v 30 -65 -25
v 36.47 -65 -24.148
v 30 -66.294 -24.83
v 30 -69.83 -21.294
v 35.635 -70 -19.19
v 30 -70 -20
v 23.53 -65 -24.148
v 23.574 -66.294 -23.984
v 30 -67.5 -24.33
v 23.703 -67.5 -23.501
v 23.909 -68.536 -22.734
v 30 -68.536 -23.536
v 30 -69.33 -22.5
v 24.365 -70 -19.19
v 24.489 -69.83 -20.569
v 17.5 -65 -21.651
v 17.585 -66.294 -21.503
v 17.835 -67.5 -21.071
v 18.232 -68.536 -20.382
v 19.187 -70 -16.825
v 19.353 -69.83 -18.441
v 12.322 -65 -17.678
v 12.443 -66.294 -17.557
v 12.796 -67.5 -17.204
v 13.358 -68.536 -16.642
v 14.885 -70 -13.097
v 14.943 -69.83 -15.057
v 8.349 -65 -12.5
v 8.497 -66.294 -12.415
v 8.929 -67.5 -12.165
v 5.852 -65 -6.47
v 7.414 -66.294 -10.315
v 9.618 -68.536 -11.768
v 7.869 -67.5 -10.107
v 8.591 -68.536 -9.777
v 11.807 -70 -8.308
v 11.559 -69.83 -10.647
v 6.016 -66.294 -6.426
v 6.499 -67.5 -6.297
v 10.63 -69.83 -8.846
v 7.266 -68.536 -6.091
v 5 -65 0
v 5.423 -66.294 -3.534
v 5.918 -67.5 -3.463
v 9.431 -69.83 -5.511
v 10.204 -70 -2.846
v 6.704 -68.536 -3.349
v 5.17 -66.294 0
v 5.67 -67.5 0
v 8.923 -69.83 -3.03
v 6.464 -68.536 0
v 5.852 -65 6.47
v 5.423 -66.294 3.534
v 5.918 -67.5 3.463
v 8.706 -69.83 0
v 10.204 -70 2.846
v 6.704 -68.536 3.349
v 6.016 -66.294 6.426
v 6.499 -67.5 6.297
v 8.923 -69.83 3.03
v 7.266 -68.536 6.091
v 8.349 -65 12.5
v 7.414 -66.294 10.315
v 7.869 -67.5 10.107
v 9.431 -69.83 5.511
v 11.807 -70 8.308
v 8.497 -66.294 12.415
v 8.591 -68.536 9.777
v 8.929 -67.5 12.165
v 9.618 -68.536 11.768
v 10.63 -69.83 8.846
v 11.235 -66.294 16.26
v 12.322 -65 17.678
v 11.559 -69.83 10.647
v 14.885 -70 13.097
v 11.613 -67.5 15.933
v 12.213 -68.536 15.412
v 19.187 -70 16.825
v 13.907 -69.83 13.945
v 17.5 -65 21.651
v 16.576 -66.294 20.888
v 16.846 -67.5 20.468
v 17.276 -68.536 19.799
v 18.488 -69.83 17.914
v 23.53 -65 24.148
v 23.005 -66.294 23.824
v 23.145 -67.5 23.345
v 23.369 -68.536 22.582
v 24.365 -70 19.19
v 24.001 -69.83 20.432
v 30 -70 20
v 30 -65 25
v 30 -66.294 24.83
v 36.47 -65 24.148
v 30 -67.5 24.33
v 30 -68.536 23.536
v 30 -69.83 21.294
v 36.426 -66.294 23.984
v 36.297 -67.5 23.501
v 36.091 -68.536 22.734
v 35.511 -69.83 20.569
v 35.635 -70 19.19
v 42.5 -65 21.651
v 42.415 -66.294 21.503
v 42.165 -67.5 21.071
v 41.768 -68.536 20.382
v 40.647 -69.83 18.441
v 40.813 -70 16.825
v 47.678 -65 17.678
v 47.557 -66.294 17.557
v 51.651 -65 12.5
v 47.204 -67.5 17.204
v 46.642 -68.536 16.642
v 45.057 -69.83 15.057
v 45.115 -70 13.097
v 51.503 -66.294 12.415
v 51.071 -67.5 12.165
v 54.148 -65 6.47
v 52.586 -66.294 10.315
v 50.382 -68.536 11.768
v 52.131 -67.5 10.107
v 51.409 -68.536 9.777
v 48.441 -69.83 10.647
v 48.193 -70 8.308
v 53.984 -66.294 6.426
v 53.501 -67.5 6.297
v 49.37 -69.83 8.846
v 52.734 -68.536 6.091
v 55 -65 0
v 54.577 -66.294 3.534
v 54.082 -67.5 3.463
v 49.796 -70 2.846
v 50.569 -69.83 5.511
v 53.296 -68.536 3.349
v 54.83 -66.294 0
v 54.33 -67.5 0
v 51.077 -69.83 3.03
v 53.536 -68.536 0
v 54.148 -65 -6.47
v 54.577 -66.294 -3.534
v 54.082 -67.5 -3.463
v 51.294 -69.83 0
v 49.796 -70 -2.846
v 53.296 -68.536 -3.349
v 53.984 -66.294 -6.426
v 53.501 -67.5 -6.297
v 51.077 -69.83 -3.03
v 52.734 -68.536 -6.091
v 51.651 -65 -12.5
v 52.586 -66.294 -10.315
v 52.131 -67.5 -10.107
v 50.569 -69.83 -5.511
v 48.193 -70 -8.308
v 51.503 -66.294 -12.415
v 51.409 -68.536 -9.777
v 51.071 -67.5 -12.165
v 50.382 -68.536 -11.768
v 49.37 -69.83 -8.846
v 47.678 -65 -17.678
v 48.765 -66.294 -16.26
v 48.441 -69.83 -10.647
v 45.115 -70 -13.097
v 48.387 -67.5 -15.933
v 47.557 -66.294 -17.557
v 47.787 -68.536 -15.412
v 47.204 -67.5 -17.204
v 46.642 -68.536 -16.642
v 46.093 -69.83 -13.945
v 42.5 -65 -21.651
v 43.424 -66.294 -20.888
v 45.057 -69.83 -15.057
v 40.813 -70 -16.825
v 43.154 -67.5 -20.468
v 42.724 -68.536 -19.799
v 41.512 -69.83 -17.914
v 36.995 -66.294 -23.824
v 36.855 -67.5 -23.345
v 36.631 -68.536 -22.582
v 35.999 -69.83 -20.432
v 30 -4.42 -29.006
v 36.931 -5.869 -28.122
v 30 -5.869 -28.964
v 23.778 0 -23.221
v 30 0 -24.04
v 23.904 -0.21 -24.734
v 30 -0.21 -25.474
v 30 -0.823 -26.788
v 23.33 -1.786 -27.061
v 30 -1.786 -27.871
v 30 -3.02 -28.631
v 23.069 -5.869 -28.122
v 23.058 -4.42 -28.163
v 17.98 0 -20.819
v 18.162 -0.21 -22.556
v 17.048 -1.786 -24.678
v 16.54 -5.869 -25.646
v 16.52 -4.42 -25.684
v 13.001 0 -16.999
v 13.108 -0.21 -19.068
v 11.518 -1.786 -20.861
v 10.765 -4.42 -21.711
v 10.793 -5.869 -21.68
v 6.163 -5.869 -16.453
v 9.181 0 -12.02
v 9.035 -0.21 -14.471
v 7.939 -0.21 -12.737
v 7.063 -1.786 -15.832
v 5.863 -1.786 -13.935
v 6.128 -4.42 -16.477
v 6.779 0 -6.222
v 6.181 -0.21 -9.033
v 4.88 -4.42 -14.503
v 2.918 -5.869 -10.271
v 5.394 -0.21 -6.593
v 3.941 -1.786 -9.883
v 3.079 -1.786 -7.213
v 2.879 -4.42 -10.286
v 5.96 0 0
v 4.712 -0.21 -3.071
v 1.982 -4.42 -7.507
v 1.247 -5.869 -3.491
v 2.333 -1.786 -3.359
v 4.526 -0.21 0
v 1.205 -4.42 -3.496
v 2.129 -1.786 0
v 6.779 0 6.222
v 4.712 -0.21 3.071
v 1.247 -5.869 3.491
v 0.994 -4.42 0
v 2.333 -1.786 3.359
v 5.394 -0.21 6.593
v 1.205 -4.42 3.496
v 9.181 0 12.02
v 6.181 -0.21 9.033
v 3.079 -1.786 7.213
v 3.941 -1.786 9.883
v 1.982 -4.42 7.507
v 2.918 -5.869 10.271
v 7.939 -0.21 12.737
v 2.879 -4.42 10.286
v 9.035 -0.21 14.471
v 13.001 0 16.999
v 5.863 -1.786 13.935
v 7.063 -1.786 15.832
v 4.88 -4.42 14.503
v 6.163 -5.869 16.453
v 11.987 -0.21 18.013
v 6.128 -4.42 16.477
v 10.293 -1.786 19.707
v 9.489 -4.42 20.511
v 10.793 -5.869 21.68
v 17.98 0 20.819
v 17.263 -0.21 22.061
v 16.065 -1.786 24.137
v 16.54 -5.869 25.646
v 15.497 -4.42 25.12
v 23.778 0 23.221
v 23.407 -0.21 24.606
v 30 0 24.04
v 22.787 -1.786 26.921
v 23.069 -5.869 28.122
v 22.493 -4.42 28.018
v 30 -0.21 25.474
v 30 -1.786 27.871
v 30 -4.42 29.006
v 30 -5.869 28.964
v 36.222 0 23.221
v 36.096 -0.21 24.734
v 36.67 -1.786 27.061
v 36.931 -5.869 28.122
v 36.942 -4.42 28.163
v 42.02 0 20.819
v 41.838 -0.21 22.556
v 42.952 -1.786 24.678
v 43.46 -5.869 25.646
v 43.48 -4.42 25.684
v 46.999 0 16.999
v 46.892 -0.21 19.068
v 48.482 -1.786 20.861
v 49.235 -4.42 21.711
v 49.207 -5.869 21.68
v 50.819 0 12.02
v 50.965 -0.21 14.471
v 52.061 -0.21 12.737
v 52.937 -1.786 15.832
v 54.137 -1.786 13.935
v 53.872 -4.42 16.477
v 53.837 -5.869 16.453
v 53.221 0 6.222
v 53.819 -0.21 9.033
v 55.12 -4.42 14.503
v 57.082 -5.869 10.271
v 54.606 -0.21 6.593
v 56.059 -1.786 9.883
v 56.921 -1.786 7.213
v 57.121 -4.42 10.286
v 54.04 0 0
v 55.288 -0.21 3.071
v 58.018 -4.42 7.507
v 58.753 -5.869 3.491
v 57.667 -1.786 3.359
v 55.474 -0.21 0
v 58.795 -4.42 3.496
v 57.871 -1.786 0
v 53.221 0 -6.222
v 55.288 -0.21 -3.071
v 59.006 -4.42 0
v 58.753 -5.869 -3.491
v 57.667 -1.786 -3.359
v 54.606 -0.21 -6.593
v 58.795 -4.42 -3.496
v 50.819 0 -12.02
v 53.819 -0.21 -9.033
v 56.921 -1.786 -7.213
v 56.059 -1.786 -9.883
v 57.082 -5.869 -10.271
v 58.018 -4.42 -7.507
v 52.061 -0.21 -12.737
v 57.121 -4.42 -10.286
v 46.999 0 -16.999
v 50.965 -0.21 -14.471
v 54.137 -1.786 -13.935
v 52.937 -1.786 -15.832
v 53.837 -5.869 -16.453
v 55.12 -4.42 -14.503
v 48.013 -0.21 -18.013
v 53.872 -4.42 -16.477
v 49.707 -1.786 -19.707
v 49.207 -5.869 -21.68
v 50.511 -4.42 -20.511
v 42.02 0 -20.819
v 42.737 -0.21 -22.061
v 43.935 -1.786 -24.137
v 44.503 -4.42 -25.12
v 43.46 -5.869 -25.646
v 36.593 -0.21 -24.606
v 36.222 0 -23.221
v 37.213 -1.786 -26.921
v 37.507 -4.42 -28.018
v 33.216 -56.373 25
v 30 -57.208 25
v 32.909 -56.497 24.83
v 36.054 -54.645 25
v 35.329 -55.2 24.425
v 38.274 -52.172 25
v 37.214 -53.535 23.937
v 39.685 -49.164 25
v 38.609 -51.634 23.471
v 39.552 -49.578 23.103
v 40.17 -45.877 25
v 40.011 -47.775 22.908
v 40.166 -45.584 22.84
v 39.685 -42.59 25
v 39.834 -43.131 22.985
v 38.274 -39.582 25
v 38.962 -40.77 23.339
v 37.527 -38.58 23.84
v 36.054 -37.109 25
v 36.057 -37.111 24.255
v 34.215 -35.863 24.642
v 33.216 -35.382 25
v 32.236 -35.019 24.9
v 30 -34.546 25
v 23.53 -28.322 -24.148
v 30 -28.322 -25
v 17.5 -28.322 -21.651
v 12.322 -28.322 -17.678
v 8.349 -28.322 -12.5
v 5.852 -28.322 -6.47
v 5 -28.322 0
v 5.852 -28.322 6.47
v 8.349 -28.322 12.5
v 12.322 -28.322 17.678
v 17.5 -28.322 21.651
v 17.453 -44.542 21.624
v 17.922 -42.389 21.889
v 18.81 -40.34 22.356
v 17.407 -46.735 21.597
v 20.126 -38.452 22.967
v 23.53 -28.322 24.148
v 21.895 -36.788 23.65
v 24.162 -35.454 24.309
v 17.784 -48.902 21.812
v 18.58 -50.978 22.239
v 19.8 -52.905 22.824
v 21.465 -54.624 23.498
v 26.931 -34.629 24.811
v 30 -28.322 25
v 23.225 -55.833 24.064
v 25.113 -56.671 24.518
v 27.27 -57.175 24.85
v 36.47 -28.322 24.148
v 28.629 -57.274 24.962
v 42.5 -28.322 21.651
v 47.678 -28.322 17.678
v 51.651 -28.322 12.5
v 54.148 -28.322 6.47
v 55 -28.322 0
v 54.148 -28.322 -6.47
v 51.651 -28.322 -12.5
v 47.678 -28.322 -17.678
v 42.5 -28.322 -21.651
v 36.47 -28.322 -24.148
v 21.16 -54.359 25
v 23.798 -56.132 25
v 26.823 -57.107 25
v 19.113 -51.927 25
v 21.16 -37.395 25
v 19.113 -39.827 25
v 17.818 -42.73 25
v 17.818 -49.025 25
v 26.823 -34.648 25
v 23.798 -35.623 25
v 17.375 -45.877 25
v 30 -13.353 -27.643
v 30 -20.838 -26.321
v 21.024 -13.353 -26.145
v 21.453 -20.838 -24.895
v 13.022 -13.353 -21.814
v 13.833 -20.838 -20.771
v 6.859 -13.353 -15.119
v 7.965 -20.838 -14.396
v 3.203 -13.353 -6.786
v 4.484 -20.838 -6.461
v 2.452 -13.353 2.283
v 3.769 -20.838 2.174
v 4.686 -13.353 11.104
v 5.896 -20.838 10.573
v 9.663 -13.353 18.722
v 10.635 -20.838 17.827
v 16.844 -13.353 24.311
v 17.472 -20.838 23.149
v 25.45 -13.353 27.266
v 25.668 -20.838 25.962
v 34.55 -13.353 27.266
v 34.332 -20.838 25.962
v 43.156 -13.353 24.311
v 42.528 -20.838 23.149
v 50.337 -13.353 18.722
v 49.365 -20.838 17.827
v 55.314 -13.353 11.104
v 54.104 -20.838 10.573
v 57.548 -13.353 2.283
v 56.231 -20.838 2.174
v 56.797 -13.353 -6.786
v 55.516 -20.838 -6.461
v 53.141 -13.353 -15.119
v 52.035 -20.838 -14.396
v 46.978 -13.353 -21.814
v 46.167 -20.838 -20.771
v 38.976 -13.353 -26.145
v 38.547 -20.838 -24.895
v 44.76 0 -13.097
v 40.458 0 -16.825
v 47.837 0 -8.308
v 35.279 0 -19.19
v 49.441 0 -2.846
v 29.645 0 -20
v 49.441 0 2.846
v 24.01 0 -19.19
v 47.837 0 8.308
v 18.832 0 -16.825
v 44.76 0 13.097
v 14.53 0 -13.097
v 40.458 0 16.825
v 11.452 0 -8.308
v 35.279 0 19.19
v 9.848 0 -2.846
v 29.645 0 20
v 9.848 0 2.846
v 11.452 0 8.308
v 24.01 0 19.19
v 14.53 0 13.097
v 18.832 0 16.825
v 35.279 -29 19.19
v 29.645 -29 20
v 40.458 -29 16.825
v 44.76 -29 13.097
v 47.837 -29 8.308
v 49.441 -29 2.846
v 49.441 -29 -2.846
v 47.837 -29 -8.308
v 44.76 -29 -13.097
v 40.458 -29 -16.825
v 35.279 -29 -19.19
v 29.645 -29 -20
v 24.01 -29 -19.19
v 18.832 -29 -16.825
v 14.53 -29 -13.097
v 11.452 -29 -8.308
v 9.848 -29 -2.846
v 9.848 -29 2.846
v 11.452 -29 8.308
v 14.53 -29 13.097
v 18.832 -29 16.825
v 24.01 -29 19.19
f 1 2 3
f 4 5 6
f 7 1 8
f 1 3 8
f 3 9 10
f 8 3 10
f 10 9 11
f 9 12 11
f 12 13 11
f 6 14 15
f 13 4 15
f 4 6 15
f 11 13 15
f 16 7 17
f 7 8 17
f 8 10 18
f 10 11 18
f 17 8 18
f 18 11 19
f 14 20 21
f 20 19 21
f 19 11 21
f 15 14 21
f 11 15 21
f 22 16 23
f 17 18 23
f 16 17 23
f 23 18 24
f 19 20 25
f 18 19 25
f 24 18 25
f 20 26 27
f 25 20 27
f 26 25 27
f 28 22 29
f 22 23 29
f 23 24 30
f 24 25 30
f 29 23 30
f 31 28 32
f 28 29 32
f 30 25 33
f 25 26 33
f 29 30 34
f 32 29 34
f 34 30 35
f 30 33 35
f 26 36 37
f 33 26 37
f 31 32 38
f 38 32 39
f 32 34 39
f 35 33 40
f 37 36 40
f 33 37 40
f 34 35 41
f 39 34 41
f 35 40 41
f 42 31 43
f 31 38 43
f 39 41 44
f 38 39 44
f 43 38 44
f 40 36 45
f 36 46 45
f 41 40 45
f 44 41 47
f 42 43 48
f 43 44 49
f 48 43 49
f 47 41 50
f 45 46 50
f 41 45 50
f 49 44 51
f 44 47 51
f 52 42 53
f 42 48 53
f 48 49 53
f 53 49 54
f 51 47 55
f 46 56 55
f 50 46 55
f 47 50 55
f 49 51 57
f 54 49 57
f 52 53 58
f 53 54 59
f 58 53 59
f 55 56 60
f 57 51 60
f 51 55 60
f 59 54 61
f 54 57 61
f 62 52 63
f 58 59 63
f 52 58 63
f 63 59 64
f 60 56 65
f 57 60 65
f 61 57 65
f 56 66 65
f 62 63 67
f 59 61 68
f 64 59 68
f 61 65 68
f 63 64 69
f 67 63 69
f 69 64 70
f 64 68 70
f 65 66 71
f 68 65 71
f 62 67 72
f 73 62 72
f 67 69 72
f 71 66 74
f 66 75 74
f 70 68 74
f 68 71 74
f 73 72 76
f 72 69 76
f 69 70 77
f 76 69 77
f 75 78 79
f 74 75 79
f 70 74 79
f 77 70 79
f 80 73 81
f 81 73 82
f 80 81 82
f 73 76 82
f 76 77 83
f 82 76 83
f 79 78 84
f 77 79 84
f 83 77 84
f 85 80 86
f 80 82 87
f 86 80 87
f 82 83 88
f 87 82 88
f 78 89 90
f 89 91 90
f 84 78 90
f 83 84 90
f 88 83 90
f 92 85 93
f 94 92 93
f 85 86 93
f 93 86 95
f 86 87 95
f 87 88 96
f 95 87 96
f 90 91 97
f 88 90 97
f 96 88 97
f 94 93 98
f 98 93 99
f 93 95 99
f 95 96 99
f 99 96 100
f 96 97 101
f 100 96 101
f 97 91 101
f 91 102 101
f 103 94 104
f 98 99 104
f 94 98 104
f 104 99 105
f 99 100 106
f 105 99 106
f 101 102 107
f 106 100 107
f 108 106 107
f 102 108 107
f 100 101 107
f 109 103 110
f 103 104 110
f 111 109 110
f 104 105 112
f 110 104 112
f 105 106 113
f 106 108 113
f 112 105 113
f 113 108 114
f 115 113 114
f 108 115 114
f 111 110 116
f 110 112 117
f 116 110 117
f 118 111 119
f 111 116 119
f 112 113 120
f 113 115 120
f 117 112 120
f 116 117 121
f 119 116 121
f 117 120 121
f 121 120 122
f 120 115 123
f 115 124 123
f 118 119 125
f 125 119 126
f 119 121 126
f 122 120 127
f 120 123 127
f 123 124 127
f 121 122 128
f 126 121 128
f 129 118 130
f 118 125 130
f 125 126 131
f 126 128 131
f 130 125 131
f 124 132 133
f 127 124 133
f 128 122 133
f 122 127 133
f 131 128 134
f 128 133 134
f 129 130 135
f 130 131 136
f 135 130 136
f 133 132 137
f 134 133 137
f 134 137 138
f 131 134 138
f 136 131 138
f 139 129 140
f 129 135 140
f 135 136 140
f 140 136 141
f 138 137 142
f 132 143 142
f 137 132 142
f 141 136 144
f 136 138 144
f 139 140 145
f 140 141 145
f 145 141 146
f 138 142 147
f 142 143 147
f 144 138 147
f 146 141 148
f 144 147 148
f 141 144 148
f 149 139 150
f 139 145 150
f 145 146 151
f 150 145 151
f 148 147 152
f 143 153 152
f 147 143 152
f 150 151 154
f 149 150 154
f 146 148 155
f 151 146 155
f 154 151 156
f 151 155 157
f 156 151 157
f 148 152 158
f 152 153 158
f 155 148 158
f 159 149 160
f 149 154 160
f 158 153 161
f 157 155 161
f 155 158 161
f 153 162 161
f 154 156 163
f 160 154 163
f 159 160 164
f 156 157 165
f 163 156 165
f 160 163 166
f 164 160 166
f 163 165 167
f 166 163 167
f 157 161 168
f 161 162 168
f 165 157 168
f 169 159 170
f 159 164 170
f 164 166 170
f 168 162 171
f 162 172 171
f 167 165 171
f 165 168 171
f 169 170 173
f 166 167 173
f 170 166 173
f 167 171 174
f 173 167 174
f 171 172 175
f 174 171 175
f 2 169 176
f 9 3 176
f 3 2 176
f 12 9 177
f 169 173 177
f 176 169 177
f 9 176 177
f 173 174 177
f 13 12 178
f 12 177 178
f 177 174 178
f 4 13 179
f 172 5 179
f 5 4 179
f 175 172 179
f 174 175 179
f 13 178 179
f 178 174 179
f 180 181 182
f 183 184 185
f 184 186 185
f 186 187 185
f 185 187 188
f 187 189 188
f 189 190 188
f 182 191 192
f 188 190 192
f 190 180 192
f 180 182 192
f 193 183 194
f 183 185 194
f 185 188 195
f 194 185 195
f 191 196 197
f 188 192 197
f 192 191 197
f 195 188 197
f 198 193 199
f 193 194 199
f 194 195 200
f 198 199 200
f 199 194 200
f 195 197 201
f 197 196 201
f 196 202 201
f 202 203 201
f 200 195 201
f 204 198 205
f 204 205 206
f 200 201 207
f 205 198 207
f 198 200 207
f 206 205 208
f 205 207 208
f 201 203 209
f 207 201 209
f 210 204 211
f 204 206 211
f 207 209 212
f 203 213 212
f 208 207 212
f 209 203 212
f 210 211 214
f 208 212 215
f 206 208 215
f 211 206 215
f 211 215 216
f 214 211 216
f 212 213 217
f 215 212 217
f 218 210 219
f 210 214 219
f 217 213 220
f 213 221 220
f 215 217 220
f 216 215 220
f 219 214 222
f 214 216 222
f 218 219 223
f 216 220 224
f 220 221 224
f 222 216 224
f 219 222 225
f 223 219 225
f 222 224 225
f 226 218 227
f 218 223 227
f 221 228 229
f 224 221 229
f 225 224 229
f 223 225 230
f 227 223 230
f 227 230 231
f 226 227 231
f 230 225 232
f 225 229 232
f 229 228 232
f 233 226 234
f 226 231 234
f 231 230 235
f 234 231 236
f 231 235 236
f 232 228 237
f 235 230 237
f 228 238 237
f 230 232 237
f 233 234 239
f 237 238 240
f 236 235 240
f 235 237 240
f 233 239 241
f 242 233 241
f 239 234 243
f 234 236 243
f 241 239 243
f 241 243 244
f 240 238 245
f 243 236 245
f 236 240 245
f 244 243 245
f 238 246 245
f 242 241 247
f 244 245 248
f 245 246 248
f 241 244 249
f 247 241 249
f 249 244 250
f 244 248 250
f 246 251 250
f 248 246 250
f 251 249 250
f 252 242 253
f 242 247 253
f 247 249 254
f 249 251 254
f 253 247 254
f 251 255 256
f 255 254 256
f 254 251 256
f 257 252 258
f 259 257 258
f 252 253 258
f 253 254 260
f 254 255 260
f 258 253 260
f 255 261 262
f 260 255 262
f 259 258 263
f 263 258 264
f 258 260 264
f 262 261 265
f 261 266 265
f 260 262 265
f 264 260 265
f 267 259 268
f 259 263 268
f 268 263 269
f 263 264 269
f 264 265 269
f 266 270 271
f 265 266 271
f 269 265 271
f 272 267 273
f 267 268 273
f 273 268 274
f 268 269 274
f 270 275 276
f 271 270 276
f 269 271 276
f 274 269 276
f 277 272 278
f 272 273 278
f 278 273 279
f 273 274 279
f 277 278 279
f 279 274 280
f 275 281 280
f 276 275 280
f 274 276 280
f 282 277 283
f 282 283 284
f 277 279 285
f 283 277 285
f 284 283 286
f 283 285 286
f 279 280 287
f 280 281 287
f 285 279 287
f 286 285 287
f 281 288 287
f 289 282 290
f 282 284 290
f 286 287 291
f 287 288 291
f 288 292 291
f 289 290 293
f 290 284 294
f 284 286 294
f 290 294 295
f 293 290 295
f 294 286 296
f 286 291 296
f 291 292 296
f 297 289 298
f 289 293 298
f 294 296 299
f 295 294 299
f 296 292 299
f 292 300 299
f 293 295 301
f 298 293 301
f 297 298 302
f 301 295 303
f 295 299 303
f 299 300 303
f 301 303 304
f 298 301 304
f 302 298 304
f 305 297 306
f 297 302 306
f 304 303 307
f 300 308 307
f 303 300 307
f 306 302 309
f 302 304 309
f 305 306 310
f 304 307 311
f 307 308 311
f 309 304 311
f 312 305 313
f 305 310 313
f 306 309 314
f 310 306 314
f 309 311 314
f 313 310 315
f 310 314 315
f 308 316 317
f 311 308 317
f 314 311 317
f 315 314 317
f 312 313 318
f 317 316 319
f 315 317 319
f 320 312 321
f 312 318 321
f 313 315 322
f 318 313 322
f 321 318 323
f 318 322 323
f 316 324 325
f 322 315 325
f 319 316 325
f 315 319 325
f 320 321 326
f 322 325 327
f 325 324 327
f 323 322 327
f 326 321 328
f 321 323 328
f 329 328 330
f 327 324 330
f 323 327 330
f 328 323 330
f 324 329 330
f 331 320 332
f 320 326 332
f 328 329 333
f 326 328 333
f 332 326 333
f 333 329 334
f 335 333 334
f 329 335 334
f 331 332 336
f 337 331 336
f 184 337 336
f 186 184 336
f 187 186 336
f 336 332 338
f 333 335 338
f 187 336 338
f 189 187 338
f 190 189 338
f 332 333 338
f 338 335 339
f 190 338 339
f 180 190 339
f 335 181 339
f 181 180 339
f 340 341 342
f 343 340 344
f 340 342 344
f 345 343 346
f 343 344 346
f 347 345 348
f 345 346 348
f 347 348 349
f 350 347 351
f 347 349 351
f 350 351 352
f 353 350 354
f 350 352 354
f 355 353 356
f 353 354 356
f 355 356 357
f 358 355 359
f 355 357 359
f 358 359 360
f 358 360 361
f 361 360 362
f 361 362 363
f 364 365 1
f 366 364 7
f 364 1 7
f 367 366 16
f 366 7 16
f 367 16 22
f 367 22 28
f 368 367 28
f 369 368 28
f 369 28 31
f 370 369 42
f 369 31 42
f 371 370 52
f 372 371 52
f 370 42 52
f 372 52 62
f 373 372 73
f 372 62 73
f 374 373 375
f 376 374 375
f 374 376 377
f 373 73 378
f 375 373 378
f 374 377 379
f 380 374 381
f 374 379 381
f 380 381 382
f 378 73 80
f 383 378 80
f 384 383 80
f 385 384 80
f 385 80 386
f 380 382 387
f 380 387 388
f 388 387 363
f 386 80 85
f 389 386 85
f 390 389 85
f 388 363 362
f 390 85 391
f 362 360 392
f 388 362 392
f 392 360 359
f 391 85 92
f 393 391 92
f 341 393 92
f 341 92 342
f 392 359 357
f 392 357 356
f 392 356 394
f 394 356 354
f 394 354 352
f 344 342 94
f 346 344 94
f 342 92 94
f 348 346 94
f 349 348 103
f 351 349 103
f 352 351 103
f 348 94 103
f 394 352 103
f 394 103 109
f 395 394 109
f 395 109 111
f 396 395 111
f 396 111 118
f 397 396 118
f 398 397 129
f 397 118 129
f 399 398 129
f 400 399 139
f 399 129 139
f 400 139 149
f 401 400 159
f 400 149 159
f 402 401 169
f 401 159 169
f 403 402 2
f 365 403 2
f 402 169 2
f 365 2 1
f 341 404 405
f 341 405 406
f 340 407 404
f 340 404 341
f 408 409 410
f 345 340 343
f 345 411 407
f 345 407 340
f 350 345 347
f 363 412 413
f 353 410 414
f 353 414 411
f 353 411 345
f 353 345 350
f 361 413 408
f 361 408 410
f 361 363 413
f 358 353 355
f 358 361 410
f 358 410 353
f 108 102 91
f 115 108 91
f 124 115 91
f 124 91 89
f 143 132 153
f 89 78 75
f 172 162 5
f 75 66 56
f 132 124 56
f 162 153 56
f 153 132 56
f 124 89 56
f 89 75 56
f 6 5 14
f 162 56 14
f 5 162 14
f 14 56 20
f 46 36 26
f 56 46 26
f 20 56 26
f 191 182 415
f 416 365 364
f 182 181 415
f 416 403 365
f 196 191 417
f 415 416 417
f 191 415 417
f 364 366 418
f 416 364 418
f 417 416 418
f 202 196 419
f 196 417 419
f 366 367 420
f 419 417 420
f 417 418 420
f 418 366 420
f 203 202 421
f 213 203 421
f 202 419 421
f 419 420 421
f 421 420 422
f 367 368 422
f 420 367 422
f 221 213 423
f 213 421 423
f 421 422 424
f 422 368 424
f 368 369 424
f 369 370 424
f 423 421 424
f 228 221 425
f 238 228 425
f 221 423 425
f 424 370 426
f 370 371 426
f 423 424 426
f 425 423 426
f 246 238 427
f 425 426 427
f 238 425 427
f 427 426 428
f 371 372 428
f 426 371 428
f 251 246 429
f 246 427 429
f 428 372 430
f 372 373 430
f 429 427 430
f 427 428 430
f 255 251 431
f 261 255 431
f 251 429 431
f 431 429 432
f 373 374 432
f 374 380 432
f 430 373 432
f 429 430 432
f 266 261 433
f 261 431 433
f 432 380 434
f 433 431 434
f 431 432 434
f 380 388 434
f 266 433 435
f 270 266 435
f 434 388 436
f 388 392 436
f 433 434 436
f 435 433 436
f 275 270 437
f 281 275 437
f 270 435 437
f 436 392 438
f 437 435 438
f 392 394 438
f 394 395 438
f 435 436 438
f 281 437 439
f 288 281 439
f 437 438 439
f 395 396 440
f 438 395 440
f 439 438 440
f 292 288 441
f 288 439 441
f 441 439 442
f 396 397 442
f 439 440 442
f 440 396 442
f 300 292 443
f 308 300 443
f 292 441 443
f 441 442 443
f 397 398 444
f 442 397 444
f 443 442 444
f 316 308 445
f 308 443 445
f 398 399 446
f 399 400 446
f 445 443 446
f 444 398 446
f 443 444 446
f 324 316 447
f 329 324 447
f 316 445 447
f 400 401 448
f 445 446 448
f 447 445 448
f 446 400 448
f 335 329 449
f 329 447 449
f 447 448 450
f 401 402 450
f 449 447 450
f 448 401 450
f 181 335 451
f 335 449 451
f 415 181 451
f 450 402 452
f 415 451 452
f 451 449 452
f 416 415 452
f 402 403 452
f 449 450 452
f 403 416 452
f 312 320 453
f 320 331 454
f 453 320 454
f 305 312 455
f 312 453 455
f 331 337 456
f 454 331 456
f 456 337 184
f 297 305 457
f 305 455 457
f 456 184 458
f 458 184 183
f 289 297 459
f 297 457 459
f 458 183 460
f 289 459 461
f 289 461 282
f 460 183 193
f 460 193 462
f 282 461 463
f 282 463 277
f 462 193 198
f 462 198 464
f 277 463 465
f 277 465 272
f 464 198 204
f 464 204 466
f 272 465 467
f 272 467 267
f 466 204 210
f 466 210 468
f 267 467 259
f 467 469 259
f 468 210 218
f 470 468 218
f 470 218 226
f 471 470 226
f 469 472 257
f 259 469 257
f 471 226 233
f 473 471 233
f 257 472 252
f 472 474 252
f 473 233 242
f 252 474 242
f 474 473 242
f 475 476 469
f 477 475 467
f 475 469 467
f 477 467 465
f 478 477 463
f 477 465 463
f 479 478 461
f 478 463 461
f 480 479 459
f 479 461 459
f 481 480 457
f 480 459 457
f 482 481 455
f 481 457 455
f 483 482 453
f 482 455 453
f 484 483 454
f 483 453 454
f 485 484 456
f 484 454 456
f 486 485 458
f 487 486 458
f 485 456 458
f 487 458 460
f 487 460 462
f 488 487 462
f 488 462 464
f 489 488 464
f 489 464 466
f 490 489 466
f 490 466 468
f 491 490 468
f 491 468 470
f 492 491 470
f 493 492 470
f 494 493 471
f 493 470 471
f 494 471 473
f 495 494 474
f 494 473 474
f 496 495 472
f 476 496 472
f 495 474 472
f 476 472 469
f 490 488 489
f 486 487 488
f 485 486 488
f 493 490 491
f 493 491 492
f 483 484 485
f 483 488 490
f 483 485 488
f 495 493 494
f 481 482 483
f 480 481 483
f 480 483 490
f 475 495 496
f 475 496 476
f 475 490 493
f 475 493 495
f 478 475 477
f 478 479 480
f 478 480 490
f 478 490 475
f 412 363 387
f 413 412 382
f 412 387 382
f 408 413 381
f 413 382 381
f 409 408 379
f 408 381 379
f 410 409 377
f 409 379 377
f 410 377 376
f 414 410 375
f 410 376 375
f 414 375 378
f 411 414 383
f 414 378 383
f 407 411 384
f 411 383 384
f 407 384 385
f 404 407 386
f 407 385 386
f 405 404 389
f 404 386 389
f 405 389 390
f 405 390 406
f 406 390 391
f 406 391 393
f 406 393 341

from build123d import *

# Parameters (mm, degrees)
SKETCH13_R          = 20
CUT_EXTRUDE1_DEPTH  = 29
SKETCH14_R          = 11.397429613
BOSS_EXTRUDE1_DEPTH = 25


with BuildPart() as part:
    # Sketch12 → Revolve2 (revolve)
    with BuildSketch(Plane.XY, mode=Mode.PRIVATE) as revolve2_sk:
        with BuildLine():
            Line((1.036180374, -5.869273447), (5, -28.321678322))
            Line((5, -28.321678322), (5, -65))
            ThreePointArc((5, -65), (6.464466094, -68.535533906), (10, -70))
            Line((10, -70), (30, -70))
            Line((30, -70), (30, 0))
            Line((30, 0), (5.960036959, 0))
            ThreePointArc((5.960036959, 0), (2.129477781, -1.786463571), (1.036180374, -5.869273447))
        make_face()
    revolve(revolve2_sk.sketch.rotate(Axis((30, -70, 0), (0, 1, 0)), 270), axis=Axis((30, -70, 0), (0, 1, 0)))

    # Sketch13 → Cut-Extrude1 (cut)
    with BuildSketch(Plane(origin=(0, 0, 0), x_dir=(1, 0, 0), z_dir=(0, 1, 0))):
        with Locations(Location((29.644688486, 0, 0), (0, 0, 270))):
            Circle(SKETCH13_R)
    extrude(amount=-CUT_EXTRUDE1_DEPTH, mode=Mode.SUBTRACT)

    # Sketch14 → Boss-Extrude1 (add)
    with BuildSketch(Plane.XY):
        with Locations((28.772395524, -45.877146633)):
            Circle(SKETCH14_R)
    extrude(amount=BOSS_EXTRUDE1_DEPTH)


solid = part.part
